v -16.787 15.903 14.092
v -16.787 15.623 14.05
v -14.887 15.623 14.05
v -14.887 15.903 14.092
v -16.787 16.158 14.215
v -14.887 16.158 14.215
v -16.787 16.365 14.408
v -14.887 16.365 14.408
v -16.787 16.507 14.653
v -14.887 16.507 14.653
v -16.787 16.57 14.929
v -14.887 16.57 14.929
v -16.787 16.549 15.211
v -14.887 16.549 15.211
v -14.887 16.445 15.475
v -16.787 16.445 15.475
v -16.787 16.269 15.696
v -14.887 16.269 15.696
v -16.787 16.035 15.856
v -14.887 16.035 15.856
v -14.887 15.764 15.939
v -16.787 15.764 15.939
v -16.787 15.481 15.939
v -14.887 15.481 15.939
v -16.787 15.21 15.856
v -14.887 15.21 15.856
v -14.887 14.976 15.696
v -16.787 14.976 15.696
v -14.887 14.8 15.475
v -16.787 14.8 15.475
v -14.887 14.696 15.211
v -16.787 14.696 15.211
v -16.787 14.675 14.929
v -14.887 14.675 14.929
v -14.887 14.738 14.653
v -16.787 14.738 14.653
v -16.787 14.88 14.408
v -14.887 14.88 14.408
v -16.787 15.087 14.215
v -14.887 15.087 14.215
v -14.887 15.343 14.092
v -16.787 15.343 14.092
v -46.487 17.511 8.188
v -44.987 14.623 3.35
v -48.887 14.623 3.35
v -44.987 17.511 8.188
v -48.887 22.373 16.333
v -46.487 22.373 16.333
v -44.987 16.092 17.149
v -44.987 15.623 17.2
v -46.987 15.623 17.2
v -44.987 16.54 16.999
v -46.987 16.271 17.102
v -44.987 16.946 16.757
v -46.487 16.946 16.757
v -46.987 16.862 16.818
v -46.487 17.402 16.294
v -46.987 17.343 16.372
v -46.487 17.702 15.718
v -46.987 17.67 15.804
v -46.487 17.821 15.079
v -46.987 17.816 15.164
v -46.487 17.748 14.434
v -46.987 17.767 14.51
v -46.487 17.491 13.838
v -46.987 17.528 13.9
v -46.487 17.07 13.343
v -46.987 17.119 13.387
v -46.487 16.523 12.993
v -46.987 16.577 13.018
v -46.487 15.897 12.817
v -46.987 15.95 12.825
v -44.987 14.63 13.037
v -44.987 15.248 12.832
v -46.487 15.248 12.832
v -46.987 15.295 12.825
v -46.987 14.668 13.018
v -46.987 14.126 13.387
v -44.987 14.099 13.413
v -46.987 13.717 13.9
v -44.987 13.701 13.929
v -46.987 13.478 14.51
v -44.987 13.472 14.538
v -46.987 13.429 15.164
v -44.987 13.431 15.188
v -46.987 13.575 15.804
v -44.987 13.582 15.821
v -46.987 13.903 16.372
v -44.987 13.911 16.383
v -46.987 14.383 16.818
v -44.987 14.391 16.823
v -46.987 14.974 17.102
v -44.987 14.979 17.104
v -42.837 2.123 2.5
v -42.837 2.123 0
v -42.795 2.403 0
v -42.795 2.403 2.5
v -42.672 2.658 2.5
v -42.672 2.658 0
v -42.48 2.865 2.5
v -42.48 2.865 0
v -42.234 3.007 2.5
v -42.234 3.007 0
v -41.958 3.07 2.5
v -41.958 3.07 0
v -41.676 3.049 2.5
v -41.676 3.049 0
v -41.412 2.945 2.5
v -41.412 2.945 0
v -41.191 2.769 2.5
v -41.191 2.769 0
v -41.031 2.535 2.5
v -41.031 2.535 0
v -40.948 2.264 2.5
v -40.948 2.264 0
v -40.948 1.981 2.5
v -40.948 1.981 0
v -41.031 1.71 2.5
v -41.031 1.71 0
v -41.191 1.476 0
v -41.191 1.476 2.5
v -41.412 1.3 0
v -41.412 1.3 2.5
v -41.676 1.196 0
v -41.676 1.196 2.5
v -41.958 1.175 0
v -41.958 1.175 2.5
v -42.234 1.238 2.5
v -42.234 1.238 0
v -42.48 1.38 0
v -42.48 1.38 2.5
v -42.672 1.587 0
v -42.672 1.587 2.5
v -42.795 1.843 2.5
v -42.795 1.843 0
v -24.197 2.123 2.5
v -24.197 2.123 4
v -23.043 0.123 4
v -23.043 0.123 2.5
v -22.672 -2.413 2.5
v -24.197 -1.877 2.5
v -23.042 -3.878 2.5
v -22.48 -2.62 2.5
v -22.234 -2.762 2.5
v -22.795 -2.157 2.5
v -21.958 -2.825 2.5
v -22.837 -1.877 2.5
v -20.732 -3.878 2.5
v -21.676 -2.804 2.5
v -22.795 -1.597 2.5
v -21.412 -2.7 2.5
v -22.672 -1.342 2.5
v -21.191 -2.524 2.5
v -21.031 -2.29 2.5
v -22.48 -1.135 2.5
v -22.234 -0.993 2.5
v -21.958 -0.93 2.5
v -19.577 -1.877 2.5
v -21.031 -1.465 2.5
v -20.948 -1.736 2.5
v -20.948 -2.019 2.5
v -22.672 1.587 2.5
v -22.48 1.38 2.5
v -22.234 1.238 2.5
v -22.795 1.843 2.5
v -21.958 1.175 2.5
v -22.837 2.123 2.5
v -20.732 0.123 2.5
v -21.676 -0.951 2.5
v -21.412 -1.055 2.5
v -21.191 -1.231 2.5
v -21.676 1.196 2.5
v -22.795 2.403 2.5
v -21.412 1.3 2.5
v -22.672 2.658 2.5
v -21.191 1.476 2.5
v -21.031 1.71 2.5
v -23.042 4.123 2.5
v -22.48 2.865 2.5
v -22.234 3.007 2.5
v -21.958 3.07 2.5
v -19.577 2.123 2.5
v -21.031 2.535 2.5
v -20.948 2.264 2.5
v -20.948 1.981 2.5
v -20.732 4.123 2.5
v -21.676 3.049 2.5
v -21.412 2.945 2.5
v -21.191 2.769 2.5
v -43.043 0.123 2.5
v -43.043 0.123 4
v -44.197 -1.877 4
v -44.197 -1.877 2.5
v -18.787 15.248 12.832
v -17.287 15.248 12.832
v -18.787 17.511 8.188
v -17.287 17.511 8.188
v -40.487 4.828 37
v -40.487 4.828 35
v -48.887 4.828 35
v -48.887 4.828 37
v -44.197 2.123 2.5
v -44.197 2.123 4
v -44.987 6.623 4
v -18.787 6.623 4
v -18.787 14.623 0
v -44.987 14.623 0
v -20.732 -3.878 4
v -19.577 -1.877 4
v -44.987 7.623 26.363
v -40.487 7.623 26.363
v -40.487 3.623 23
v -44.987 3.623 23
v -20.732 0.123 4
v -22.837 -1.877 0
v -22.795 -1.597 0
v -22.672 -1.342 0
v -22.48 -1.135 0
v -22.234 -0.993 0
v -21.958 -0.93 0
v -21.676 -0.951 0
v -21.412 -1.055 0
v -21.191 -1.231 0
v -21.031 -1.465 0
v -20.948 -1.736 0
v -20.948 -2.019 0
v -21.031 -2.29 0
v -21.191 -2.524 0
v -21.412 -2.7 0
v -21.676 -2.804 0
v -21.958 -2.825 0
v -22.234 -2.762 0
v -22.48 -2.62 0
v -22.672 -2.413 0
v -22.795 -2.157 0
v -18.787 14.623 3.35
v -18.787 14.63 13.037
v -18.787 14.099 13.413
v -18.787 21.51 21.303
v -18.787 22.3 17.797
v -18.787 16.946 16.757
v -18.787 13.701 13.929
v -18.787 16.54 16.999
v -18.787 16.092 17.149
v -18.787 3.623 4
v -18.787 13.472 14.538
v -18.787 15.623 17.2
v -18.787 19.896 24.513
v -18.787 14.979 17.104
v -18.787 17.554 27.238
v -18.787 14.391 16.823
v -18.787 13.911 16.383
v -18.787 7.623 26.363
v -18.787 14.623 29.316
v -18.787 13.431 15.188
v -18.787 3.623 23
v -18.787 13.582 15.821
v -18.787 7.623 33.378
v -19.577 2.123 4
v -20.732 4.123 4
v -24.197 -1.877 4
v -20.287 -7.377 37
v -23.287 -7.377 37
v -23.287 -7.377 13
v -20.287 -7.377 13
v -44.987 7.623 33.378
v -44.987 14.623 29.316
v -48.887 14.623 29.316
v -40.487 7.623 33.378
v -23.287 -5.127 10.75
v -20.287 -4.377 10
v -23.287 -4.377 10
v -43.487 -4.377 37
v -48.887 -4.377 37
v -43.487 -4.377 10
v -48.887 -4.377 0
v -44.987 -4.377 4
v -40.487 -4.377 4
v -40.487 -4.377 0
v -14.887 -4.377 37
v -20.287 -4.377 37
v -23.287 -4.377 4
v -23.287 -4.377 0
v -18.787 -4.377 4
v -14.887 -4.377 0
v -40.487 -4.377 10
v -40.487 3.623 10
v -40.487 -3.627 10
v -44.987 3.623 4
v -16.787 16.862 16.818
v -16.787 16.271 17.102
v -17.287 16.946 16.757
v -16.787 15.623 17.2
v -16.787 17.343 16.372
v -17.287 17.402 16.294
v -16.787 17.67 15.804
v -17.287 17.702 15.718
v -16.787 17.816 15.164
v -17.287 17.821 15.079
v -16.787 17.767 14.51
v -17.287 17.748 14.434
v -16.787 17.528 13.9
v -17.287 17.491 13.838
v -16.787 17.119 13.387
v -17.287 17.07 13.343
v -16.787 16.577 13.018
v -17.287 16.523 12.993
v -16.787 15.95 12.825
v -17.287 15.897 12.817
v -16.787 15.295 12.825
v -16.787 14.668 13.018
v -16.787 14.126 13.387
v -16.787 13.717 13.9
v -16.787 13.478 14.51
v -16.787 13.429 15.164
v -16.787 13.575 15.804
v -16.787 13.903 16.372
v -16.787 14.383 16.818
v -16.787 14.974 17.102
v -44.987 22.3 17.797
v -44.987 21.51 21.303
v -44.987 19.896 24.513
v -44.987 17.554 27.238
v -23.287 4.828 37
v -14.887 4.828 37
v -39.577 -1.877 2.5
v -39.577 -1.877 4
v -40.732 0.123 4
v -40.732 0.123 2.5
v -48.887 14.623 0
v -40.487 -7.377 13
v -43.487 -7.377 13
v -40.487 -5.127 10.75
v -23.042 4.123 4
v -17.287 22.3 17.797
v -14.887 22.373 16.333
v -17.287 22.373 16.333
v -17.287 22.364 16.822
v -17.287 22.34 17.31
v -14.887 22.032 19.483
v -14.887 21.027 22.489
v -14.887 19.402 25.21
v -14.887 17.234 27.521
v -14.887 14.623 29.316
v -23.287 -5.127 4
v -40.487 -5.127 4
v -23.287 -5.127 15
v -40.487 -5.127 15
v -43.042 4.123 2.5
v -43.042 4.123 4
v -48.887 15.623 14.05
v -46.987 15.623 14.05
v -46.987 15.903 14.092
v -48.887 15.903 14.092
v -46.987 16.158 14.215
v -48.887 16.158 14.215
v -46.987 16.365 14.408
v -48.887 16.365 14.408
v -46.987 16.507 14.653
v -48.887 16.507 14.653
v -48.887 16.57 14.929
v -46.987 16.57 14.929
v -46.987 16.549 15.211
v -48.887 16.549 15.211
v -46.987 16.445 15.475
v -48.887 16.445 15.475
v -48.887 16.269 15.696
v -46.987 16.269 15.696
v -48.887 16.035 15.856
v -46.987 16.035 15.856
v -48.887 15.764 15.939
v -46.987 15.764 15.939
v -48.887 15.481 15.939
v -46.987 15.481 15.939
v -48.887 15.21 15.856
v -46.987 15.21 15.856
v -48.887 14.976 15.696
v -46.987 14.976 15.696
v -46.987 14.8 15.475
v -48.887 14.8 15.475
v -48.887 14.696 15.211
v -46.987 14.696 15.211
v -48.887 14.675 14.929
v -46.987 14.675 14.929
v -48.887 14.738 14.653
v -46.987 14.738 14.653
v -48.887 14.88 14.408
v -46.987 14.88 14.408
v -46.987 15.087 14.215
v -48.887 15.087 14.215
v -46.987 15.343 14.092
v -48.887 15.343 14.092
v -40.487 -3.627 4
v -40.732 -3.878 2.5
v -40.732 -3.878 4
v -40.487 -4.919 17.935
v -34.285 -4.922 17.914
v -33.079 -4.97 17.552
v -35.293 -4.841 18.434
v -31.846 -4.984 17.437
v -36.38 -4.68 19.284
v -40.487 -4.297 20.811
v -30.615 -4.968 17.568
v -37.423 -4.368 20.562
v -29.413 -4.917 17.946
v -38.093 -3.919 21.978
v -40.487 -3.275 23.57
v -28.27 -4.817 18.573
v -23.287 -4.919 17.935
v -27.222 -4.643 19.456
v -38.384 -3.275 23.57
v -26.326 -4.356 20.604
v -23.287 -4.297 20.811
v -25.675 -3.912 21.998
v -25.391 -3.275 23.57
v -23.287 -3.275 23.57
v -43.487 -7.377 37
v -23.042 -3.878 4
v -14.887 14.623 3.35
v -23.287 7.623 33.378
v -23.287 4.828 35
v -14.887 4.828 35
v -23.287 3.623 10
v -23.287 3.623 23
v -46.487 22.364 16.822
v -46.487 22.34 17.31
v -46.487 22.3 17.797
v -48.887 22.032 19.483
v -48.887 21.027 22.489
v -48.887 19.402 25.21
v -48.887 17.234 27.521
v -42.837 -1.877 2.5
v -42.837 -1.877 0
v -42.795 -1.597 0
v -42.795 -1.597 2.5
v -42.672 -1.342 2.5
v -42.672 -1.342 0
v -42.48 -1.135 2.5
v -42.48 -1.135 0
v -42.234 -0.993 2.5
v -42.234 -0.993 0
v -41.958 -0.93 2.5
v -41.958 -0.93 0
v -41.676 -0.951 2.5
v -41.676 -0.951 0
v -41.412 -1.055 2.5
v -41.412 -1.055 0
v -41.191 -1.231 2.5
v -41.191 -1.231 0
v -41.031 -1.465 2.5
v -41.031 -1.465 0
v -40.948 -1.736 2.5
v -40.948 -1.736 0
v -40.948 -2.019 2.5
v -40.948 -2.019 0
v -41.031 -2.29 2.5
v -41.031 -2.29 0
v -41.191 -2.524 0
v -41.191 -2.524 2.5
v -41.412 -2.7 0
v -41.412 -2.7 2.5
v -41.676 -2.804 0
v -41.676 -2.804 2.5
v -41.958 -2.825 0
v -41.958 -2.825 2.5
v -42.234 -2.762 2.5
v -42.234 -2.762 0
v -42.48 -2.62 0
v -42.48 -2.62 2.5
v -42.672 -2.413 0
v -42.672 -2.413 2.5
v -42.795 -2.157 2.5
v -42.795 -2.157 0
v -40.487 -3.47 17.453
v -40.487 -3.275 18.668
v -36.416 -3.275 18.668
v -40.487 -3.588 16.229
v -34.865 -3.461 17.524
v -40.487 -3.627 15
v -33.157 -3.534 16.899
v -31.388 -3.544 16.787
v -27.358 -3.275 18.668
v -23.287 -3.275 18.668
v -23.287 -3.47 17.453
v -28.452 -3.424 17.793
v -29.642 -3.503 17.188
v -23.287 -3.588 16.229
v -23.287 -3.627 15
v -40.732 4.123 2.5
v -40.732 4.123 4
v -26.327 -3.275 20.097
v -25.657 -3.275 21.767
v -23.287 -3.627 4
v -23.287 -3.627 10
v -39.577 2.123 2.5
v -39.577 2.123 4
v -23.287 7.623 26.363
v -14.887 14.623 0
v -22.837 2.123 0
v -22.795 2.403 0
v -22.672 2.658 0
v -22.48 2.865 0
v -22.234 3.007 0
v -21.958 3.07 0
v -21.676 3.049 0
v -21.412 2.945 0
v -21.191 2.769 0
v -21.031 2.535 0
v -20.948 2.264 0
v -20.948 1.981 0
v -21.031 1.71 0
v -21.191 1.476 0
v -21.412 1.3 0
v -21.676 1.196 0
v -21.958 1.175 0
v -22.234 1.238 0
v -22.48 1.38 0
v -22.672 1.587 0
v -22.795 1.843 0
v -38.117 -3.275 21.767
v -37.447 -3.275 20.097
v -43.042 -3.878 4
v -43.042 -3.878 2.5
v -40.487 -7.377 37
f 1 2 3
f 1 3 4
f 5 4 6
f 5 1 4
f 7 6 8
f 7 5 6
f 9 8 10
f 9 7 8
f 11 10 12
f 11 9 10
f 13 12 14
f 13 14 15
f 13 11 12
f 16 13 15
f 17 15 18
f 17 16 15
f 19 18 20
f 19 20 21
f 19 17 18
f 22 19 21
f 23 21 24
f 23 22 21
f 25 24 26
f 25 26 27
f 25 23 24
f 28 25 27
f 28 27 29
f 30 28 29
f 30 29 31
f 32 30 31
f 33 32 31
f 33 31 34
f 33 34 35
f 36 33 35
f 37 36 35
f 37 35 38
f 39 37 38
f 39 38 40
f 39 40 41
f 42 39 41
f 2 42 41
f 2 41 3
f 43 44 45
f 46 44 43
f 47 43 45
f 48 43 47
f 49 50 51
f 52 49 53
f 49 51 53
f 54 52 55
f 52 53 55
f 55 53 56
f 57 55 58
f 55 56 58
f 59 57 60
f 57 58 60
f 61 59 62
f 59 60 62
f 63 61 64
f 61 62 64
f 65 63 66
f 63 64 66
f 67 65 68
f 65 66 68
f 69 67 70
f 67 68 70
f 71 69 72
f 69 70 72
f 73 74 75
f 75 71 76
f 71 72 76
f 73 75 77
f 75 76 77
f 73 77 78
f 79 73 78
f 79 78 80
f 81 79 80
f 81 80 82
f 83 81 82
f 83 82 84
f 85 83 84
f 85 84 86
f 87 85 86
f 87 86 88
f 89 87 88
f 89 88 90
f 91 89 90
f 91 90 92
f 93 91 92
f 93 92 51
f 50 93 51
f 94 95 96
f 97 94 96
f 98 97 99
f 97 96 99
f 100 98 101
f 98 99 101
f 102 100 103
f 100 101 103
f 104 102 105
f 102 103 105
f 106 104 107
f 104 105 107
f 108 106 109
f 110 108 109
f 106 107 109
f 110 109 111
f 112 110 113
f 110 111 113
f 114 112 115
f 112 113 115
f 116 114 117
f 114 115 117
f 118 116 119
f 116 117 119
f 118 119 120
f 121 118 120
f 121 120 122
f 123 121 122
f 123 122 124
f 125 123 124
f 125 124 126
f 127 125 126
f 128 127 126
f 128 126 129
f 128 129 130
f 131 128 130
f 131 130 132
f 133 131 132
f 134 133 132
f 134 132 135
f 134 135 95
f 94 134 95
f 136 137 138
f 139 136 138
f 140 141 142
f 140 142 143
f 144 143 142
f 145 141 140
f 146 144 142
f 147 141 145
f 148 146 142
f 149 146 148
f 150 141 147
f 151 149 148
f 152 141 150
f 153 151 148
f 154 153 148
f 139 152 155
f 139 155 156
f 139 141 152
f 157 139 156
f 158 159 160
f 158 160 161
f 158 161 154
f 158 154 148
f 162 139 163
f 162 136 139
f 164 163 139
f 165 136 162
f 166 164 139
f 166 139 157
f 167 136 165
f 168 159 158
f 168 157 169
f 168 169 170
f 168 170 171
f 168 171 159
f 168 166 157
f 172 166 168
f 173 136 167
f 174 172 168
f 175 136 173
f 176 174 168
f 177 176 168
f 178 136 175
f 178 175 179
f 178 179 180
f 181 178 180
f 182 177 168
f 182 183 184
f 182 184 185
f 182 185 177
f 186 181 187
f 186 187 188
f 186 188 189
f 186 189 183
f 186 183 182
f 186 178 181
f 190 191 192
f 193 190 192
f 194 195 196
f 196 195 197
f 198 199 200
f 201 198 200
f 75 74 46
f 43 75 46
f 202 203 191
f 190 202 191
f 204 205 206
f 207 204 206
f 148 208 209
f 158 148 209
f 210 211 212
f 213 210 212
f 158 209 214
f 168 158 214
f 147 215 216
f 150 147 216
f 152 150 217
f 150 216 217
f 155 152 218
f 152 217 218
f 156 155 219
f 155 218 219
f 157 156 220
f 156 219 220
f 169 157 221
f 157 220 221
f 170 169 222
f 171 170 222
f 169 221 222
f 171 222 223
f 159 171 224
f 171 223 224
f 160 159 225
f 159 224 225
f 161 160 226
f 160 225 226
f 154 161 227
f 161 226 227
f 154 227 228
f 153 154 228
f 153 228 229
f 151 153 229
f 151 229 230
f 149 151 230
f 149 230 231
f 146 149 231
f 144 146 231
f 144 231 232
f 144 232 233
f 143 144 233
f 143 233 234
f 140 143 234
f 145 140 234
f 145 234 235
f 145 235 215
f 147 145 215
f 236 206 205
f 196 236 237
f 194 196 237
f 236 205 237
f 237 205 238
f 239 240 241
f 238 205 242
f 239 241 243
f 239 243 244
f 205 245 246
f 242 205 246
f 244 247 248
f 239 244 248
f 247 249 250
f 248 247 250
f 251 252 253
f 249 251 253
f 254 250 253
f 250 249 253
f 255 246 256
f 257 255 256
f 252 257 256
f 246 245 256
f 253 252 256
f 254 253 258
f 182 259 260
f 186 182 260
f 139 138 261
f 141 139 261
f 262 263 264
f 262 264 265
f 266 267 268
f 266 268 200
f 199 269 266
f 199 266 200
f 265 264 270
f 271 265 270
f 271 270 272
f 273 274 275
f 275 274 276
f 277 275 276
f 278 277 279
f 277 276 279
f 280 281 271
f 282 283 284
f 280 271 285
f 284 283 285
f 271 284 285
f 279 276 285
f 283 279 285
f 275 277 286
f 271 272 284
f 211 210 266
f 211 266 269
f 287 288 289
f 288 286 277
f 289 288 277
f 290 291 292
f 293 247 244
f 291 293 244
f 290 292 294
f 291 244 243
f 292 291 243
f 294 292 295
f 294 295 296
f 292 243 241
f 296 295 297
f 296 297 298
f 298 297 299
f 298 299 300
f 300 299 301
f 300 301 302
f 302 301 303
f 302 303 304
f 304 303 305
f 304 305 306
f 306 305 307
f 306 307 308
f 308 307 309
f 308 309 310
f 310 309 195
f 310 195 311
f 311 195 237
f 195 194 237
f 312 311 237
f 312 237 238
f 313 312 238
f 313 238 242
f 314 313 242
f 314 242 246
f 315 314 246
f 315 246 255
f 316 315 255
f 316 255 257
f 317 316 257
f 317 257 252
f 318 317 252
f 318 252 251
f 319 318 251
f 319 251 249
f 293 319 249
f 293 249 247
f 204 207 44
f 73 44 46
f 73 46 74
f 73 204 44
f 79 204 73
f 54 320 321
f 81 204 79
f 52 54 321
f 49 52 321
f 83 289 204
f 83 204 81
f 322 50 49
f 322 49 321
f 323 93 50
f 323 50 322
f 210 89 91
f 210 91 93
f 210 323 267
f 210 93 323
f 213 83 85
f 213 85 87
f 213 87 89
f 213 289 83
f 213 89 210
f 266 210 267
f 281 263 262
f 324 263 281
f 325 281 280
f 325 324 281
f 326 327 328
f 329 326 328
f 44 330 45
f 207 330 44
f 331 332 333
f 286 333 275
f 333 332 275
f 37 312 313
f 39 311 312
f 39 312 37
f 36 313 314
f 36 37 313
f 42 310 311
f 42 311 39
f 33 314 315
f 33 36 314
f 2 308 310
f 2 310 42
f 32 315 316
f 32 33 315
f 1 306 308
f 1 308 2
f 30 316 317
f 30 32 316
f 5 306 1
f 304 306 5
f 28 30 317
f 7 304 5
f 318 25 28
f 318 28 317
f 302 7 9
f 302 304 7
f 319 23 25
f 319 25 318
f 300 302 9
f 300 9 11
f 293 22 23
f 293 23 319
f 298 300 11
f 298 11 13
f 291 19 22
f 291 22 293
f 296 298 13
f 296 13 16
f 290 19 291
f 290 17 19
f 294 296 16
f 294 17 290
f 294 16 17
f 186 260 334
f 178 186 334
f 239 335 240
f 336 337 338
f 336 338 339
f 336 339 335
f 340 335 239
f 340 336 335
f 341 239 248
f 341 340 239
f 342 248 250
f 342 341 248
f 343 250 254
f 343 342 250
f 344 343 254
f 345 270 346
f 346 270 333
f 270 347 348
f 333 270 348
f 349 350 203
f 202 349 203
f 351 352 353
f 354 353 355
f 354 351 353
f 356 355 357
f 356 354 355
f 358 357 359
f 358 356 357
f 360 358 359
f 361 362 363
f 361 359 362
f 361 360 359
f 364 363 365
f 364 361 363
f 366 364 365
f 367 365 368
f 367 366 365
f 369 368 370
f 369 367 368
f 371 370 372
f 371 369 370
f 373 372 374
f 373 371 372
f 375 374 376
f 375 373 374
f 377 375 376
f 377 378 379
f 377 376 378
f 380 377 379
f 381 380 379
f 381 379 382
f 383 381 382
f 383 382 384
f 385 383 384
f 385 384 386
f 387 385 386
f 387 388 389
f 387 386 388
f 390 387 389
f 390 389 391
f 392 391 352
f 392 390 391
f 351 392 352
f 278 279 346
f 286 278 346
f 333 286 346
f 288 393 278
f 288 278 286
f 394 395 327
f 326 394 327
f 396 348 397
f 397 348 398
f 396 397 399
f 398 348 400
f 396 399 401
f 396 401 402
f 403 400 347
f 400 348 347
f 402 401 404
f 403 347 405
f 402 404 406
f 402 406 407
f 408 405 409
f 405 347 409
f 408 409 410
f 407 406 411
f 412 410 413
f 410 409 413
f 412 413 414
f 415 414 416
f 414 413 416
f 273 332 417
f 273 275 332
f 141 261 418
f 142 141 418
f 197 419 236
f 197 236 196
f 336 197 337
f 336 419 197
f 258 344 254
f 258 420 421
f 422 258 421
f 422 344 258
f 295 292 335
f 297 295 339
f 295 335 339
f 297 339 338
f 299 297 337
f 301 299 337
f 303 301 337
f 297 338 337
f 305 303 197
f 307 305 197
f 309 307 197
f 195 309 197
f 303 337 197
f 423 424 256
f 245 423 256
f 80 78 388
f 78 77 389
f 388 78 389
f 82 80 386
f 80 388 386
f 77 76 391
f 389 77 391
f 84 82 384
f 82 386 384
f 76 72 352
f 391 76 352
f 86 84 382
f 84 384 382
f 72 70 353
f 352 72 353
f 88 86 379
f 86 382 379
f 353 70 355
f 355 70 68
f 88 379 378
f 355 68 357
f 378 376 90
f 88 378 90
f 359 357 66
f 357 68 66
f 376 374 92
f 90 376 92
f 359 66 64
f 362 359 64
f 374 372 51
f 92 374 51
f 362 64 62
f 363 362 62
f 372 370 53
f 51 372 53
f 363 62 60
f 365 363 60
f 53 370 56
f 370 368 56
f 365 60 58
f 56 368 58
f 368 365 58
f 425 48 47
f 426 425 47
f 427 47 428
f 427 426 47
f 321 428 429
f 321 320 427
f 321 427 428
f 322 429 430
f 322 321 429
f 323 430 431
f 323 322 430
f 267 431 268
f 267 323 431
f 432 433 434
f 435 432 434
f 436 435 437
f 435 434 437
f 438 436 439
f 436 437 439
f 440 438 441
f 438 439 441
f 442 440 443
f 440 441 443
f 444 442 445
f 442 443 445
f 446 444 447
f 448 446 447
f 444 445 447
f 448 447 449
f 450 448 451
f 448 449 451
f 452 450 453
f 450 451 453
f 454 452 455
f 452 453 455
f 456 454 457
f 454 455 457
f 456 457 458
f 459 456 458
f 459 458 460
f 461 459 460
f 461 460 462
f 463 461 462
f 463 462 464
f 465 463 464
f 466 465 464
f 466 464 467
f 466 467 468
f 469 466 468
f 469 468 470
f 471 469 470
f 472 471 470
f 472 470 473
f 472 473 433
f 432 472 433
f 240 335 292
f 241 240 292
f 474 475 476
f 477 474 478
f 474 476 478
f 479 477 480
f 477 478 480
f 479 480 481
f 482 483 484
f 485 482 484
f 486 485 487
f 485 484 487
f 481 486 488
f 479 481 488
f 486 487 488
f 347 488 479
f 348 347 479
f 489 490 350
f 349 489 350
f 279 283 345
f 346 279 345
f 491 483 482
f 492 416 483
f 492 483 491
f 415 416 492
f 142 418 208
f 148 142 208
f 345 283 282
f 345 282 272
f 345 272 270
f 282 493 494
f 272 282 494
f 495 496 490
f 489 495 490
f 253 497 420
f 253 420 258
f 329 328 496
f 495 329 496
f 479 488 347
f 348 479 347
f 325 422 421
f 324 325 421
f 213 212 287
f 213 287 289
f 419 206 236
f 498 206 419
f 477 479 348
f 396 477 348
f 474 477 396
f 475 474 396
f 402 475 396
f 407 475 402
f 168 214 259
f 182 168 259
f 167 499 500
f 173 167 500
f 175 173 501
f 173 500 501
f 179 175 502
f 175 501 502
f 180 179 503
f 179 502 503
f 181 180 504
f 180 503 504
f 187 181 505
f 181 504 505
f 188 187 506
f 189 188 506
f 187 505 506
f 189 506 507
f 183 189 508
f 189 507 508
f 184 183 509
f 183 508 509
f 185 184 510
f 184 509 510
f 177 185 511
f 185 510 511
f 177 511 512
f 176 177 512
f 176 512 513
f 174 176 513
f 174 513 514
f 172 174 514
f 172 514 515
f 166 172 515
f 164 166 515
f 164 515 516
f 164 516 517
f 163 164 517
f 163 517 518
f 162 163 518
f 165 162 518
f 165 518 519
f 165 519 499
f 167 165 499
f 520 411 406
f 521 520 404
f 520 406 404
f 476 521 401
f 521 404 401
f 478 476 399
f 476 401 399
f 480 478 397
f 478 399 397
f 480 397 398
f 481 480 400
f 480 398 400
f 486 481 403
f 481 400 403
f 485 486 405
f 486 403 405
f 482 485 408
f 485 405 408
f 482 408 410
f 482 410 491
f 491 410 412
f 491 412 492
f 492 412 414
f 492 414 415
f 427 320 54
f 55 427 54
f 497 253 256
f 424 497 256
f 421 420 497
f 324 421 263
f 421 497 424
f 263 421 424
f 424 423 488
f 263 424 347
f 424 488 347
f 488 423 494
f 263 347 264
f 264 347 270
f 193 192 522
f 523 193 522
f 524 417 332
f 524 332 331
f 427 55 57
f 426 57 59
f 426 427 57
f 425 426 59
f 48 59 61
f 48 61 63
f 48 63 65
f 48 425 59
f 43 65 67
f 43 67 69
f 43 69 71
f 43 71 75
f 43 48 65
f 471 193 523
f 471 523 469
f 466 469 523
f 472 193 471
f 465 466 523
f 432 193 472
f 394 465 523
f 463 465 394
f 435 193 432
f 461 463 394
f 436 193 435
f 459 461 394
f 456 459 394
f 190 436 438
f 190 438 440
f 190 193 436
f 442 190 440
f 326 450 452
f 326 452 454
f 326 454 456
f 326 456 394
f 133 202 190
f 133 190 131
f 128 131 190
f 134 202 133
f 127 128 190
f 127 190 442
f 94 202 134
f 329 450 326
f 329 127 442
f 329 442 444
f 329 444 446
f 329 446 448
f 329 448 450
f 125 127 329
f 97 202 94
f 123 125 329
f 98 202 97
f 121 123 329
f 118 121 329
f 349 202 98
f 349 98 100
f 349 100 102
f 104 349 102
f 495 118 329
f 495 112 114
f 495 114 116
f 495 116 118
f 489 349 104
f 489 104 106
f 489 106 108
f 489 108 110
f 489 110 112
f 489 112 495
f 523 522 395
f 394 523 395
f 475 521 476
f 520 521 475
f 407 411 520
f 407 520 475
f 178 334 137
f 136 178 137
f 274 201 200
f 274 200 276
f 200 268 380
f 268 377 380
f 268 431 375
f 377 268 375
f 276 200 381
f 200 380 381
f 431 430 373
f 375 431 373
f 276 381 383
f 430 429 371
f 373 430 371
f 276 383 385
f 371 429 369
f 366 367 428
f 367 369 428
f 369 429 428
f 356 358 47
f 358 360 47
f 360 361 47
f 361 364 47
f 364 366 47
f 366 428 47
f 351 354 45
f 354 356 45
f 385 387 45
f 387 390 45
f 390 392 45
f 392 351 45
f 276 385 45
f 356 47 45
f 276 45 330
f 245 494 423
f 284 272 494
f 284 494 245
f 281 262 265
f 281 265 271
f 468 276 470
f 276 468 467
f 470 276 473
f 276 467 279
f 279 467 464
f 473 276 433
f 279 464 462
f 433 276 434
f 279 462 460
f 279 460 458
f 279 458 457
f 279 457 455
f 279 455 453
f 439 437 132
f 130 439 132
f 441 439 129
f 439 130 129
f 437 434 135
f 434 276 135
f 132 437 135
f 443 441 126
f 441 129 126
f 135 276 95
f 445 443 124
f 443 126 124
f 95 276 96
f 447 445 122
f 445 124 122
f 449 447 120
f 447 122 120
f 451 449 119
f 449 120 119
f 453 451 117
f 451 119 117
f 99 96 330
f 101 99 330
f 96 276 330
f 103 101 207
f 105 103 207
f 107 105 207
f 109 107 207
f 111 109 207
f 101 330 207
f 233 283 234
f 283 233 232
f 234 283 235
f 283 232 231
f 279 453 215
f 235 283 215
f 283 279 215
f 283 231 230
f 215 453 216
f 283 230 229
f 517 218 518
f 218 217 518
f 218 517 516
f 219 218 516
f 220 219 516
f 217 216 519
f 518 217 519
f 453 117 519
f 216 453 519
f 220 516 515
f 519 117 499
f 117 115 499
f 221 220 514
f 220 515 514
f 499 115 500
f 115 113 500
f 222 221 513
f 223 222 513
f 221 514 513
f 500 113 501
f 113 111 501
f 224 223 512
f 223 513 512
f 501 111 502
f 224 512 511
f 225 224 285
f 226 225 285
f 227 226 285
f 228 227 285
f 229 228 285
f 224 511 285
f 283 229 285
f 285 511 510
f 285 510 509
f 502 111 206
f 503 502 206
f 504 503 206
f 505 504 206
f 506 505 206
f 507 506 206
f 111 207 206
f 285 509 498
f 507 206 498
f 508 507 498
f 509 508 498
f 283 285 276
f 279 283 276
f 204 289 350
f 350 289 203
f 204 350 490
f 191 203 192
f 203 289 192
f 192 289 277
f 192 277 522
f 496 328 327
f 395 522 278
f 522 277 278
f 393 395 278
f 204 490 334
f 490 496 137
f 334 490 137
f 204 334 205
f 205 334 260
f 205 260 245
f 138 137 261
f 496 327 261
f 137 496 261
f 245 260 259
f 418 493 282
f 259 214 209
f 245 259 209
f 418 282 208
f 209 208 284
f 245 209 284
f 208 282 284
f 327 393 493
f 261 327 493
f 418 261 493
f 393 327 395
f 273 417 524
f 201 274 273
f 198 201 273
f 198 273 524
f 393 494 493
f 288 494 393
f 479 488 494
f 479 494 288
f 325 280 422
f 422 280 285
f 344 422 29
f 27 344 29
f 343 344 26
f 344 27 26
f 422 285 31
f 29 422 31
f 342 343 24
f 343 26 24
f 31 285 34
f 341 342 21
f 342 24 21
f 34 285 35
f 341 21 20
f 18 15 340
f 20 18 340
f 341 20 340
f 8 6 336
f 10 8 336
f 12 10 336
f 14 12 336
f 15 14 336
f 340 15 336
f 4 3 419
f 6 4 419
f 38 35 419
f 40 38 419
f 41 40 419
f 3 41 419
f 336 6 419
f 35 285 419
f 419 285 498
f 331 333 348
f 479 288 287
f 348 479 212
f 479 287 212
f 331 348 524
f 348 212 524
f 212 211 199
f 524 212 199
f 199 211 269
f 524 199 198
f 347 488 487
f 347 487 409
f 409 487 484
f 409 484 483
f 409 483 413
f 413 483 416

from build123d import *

# Parameters (mm, degrees)
CROQUIS1_W               = 34
CROQUIS1_H               = 19
SALIENTE_EXTRUIR1_DEPTH  = 35
CROQUIS2_W               = 26.2
CROQUIS2_H               = 31
CORTAR_EXTRUIR1_DEPTH    = 25
CORTAR_EXTRUIR3_DEPTH    = 26.2
SALIENTE_EXTRUIR2_DEPTH  = 34
CROQUIS10_W              = 26.2
CROQUIS10_H              = 25.966324345
CORTAR_EXTRUIR4_DEPTH    = 10
CROQUIS18_R              = 0.95
CORTAR_EXTRUIR11_DEPTH   = 4
CORTAR_EXTRUIR12_DEPTH   = 1.5
CORTAR_EXTRUIR14_START   = -34
CROQUIS21_R              = 0.95
CORTAR_EXTRUIR14_DEPTH   = 34
SALIENTE_EXTRUIR3_DEPTH  = 8
CROQUIS25_W              = 3
CROQUIS25_H              = 25
SALIENTE_EXTRUIR4_DEPTH  = 3
CROQUIS43_W              = 4.5
CROQUIS43_H              = 12
SALIENTE_EXTRUIR8_DEPTH  = 4
CORTAR_EXTRUIR20_START   = -1.5
CORTAR_EXTRUIR20_DEPTH   = 1.5
CORTAR_EXTRUIR21_DEPTH   = 27.7
CORTAR_EXTRUIR22_START   = -34
CORTAR_EXTRUIR22_DEPTH   = 34
CROQUIS36_R              = 2.2
CORTAR_EXTRUIR24_DEPTH   = 2
CORTAR_EXTRUIR25_START   = 28.2
CROQUIS36_2_R            = 2.2
CORTAR_EXTRUIR25_DEPTH   = 28.2
CORTAR_EXTRUIR26_START   = -34
CORTAR_EXTRUIR26_DEPTH   = 34
CORTAR_EXTRUIR28_START   = -23.2
CORTAR_EXTRUIR28_DEPTH   = 23.2
CORTAR_EXTRUIR29_DEPTH   = 26.2
SALIENTE_EXTRUIR9_DEPTH  = 17.2
CROQUIS49_R              = 6.5
CROQUIS50_R              = 6.5
CROQUIS53_W              = 17.2
CROQUIS53_H              = 1.49981493
SALIENTE_EXTRUIR13_DEPTH = 11
SALIENTE_EXTRUIR14_DEPTH = 17.2
SALIENTE_EXTRUIR15_DEPTH = 2
CORTAR_EXTRUIR30_DEPTH   = 20


with BuildPart() as part:
    # Croquis1 → Saliente-Extruir1 (new body)
    with BuildSketch(Plane.XY):
        with Locations((-31.887263086, 5.12254902)):
            Rectangle(CROQUIS1_W, CROQUIS1_H)
    extrude(amount=SALIENTE_EXTRUIR1_DEPTH)

    # Croquis2 → Cortar-Extruir1 (cut)
    with BuildSketch(Plane.XZ.offset(4.37745098)):
        with Locations((-31.887263086, 19.5)):
            Rectangle(CROQUIS2_W, CROQUIS2_H)
    extrude(amount=-CORTAR_EXTRUIR1_DEPTH, mode=Mode.SUBTRACT)

    # Croquis4 → Cortar-Extruir3 (cut)
    with BuildSketch(Plane.ZY.offset(18.787263086)):
        Polygon((4, 14.62254902), (4, 6.62254902), (0, 14.62254902), align=None)
    extrude(amount=CORTAR_EXTRUIR3_DEPTH, mode=Mode.SUBTRACT)

    # Croquis9 → Saliente-Extruir2 (add)
    with BuildSketch(Plane(origin=(-14.887263086, 0, 0), x_dir=(0, 0, -1), z_dir=(1, 0, 0))):
        with BuildLine():
            Line((-29.315831827, 14.62254902), (-3.349507482, 14.62254902))
            ThreePointArc((-3.349507482, 14.62254902), (-16.332669655, 22.37254902), (-29.315831827, 14.62254902))
        make_face()
    extrude(amount=-SALIENTE_EXTRUIR2_DEPTH)

    # Croquis10 → Cortar-Extruir4 (cut)
    with BuildSketch(Plane.XZ.offset(-14.62254902)):
        with Locations((-31.887263086, 16.332669655)):
            Rectangle(CROQUIS10_W, CROQUIS10_H)
    extrude(amount=-CORTAR_EXTRUIR4_DEPTH, mode=Mode.SUBTRACT)

    # Croquis18 → Cortar-Extruir11 (cut)
    with BuildSketch(Plane(origin=(0, 0, 0), x_dir=(-1, 0, 0), z_dir=(0, 0, -1))):
        with Locations((41.887263086, -1.87745098)):
            Circle(CROQUIS18_R)
        with Locations((21.887263086, -1.87745098)):
            Circle(CROQUIS18_R)
        with Locations((21.887263086, 2.12254902)):
            Circle(CROQUIS18_R)
        with Locations((41.887263086, 2.12254902)):
            Circle(CROQUIS18_R)
    extrude(amount=-CORTAR_EXTRUIR11_DEPTH, mode=Mode.SUBTRACT)

    # Croquis19 → Cortar-Extruir12 (cut)
    with BuildSketch(Plane.XY.offset(4)):
        Polygon((-44.197263086, -1.87745098), (-43.042263086, -3.877969663), (-40.732263086, -3.877969663), (-39.577263086, -1.87745098), (-40.731963624, 0.12254902), (-39.577263086, 2.12254902), (-40.732263086, 4.123067702), (-43.042263086, 4.123067702), (-44.197263086, 2.12254902), (-43.042562547, 0.12254902), align=None)
        Polygon((-24.197263086, -1.87745098), (-23.042263086, -3.877969663), (-20.732263086, -3.877969663), (-19.577263086, -1.87745098), (-20.731963624, 0.12254902), (-19.577263086, 2.12254902), (-20.732263086, 4.123067702), (-23.042263086, 4.123067702), (-24.197263086, 2.12254902), (-23.042562547, 0.12254902), align=None)
    extrude(amount=-CORTAR_EXTRUIR12_DEPTH, mode=Mode.SUBTRACT)

    # Croquis21 → Cortar-Extruir14 (cut)
    with BuildSketch(Plane(origin=(-14.887263086, 0, 0), x_dir=(0, 0, -1), z_dir=(1, 0, 0)).offset(CORTAR_EXTRUIR14_START)):
        with Locations((-15, 15.62254902)):
            Circle(CROQUIS21_R)
    extrude(amount=CORTAR_EXTRUIR14_DEPTH, mode=Mode.SUBTRACT)

    # Croquis23 → Saliente-Extruir3 (add)
    with BuildSketch(Plane.XZ.offset(4.37745098)):
        Polygon((-44.987263086, 35), (-40.487263086, 35), (-40.487263086, 10), (-44.987263086, 4), align=None)
        Polygon((-18.787263086, 35), (-23.287263086, 35), (-23.287263086, 10), (-18.787263086, 4), align=None)
    extrude(amount=-SALIENTE_EXTRUIR3_DEPTH)

    # Croquis25 → Saliente-Extruir4 (add)
    with BuildSketch(Plane.XZ.offset(4.37745098)):
        with Locations((-41.987263086, 22.5)):
            Rectangle(CROQUIS25_W, CROQUIS25_H)
        with Locations((-21.787263086, 22.5)):
            Rectangle(CROQUIS25_W, CROQUIS25_H)
    extrude(amount=SALIENTE_EXTRUIR4_DEPTH)

    # Croquis43 → Saliente-Extruir8 (add)
    with BuildSketch(Plane(origin=(0, 3.62254902, 0), x_dir=(1, 0, 0), z_dir=(0, 1, 0))):
        with Locations((-21.037263086, -29)):
            Rectangle(CROQUIS43_W, CROQUIS43_H)
        with Locations((-42.737263086, -29)):
            Rectangle(CROQUIS43_W, CROQUIS43_H)
    extrude(amount=SALIENTE_EXTRUIR8_DEPTH)

    # Croquis29 → Cortar-Extruir20 (cut)
    with BuildSketch(Plane.ZY.offset(18.787263086).offset(CORTAR_EXTRUIR20_START)):
        with BuildLine():
            Line((17.797402962, 22.299641931), (16.5, 15.62254902))
            ThreePointArc((16.5, 15.62254902), (15.426958984, 14.184596995), (13.743058632, 14.803953638))
            Line((13.743058632, 14.803953638), (6.296886003, 18.432060872))
            ThreePointArc((6.296886003, 18.432060872), (11.631045274, 21.603150873), (17.797402962, 22.299641931))
        make_face()
    extrude(amount=CORTAR_EXTRUIR20_DEPTH, mode=Mode.SUBTRACT)

    # Croquis29<2> → Cortar-Extruir21 (cut)
    with BuildSketch(Plane.ZY.offset(18.787263086)):
        with BuildLine():
            Line((17.797402962, 22.299641931), (16.5, 15.62254902))
            ThreePointArc((16.5, 15.62254902), (15.426958984, 14.184596995), (13.743058632, 14.803953638))
            Line((13.743058632, 14.803953638), (6.296886003, 18.432060872))
            ThreePointArc((6.296886003, 18.432060872), (11.631045274, 21.603150873), (17.797402962, 22.299641931))
        make_face()
    extrude(amount=CORTAR_EXTRUIR21_DEPTH, mode=Mode.SUBTRACT)

    # Croquis30 → Cortar-Extruir22 (cut)
    with BuildSketch(Plane.ZY.offset(48.887263086).offset(CORTAR_EXTRUIR22_START)):
        Polygon((29.315831827, 14.62254902), (35, 4.827802707), (35, 14.62254902), align=None)
    extrude(amount=CORTAR_EXTRUIR22_DEPTH, mode=Mode.SUBTRACT)

    # Croquis36 → Cortar-Extruir24 (cut)
    with BuildSketch(Plane.ZY.offset(18.787263086)):
        with Locations((15, 15.62254902)):
            Circle(CROQUIS36_R)
    extrude(amount=-CORTAR_EXTRUIR24_DEPTH, mode=Mode.SUBTRACT)

    # Croquis36<2> → Cortar-Extruir25 (cut)
    with BuildSketch(Plane.ZY.offset(18.787263086).offset(CORTAR_EXTRUIR25_START)):
        with Locations((15, 15.62254902)):
            Circle(CROQUIS36_2_R)
    extrude(amount=-CORTAR_EXTRUIR25_DEPTH, mode=Mode.SUBTRACT)

    # Croquis38 → Cortar-Extruir26 (cut)
    with BuildSketch(Plane.ZY.offset(48.887263086).offset(CORTAR_EXTRUIR26_START)):
        Polygon((3.349507482, 14.62254902), (16.332669655, 22.37254902), (3.349507482, 22.37254902), align=None)
    extrude(amount=CORTAR_EXTRUIR26_DEPTH, mode=Mode.SUBTRACT)

    # Croquis41 → Cortar-Extruir28 (cut)
    with BuildSketch(Plane(origin=(-20.287263086, 0, 0), x_dir=(0, 0, -1), z_dir=(1, 0, 0)).offset(CORTAR_EXTRUIR28_START)):
        Polygon((-10, -4.37745098), (-10, -7.37745098), (-13, -7.37745098), align=None)
    extrude(amount=CORTAR_EXTRUIR28_DEPTH, mode=Mode.SUBTRACT)

    # Croquis44 → Cortar-Extruir29 (cut)
    with BuildSketch(Plane.ZY.offset(18.787263086)):
        Polygon((23, 7.62254902), (26.362551066, 7.62254902), (23, 3.62254902), align=None)
    extrude(amount=CORTAR_EXTRUIR29_DEPTH, mode=Mode.SUBTRACT)



with BuildPart() as body_2:
    # Croquis45 → Saliente-Extruir9 (new body)
    with BuildSketch(Plane.ZY.offset(23.287263086)):
        with BuildLine():
            Line((32.372332418, 4.275439874), (31.142668885, 5.135569413))
            ThreePointArc((31.142668885, 5.135569413), (24.183902835, -1.295442254), (15, -3.62745098))
            Line((15, -3.62745098), (15, -5.12726591))
            ThreePointArc((15, -5.12726591), (24.876851848, -2.625810281), (32.372332418, 4.275439874))
        make_face()
    extrude(amount=SALIENTE_EXTRUIR9_DEPTH)

    # Cortar-Barrer2: sweep along a path in Croquis47
    with BuildLine(Plane(origin=(-31.887263086, 4.275439874, 32.372332418), x_dir=(0, 0, -1), z_dir=(1, 0, 0))) as cortar_barrer2_path:
        Line((17.372332418, 11.347109145), (-5.570725036, -21.418972626))
    # Croquis48 → Cortar-Barrer2 (sweep, cut)
    with BuildSketch(Plane(origin=(-31.887263086, -17.143532752, 37.943057454), x_dir=(-1, 0, 0), z_dir=(0, -0.8191520442889911, 0.5735764363510472))):
        with BuildLine():
            Line((6.5, 0), (6.5, -15))
            Line((6.5, -15), (-6.5, -15))
            Line((-6.5, -15), (-6.5, 0))
            ThreePointArc((-6.5, 0), (0, 6.5), (6.5, 0))
        make_face()
    sweep(path=cortar_barrer2_path.line, mode=Mode.SUBTRACT)

    # Cortar-Barrer3: sweep along a path in Croquis51
    with BuildLine(Plane(origin=(-31.887263086, 4.275439874, 32.372332418), x_dir=(0, 0, -1), z_dir=(1, 0, 0))) as cortar_barrer3_path:
        Line((17.372332418, 11.347109145), (-2.627667582, -23.293907006))
    # Croquis49 → Cortar-Barrer3 (sweep, cut)
    with BuildSketch(Plane(origin=(-31.887263086, -19.018467132, 35), x_dir=(-1, 0, 0), z_dir=(0, -0.8660254037844382, 0.5000000000000011))):
        Circle(CROQUIS49_R)
    sweep(path=cortar_barrer3_path.line, mode=Mode.SUBTRACT)

    # Cortar-Barrer4: sweep along a path in Croquis52
    with BuildLine(Plane(origin=(-31.887263086, 4.275439874, 32.372332418), x_dir=(0, 0, -1), z_dir=(1, 0, 0))) as cortar_barrer4_path:
        Line((17.372332418, 11.347109145), (0.467601948, -24.905202336))
    # Croquis50 → Cortar-Barrer4 (sweep, cut)
    with BuildSketch(Plane(origin=(-31.887263086, -20.629762462, 31.90473047), x_dir=(-1, 0, 0), z_dir=(0, -0.9063077870366495, 0.4226182617407004))):
        Circle(CROQUIS50_R)
    sweep(path=cortar_barrer4_path.line, mode=Mode.SUBTRACT)

    # Croquis58 → Cortar-Extruir30 (cut)
    with BuildSketch(Plane.XY.offset(37)):
        Polygon((-40.487263086, -1.274824137), (-40.487263086, 6.807025189), (-23.287263086, 6.807025189), (-23.287263086, -1.274824137), (-23.287263086, -3.274824137), (-40.487263086, -3.274824137), align=None)
    extrude(amount=-CORTAR_EXTRUIR30_DEPTH, mode=Mode.SUBTRACT)


with BuildPart() as body_3:
    # Croquis53 → Saliente-Extruir13 (new body)
    with BuildSketch(Plane(origin=(0, 0, 15), x_dir=(-1, 0, 0), z_dir=(0, 0, -1))):
        with Locations((31.887263086, -4.377358445)):
            Rectangle(CROQUIS53_W, CROQUIS53_H)
    extrude(amount=SALIENTE_EXTRUIR13_DEPTH)


with BuildPart() as part_1:
    add(part.part)

    add(body_3.part)  # Saliente-Extruir14 merges body 3
    # Croquis55 → Saliente-Extruir14 (add)
    with BuildSketch(Plane.ZY.offset(40.487263086)):
        Polygon((4, -5.12726591), (4, -4.377358445), (0, -4.377358445), align=None)
    extrude(amount=-SALIENTE_EXTRUIR14_DEPTH)

    # Croquis56 → Saliente-Extruir15 (add)
    with BuildSketch(Plane.XY.offset(35)):
        Polygon((-23.287263086, -7.37745098), (-20.287263086, -7.37745098), (-20.287263086, -4.37745098), (-14.887263086, -4.37745098), (-14.887263086, 4.827802707), (-23.287263086, 4.827802707), align=None)
        Polygon((-40.487263086, -7.37745098), (-40.487263086, 4.827802707), (-48.887263086, 4.827802707), (-48.887263086, -4.37745098), (-43.487263086, -4.37745098), (-43.487263086, -7.37745098), align=None)
    extrude(amount=SALIENTE_EXTRUIR15_DEPTH)


solid = Compound([body_2.part, part_1.part])
